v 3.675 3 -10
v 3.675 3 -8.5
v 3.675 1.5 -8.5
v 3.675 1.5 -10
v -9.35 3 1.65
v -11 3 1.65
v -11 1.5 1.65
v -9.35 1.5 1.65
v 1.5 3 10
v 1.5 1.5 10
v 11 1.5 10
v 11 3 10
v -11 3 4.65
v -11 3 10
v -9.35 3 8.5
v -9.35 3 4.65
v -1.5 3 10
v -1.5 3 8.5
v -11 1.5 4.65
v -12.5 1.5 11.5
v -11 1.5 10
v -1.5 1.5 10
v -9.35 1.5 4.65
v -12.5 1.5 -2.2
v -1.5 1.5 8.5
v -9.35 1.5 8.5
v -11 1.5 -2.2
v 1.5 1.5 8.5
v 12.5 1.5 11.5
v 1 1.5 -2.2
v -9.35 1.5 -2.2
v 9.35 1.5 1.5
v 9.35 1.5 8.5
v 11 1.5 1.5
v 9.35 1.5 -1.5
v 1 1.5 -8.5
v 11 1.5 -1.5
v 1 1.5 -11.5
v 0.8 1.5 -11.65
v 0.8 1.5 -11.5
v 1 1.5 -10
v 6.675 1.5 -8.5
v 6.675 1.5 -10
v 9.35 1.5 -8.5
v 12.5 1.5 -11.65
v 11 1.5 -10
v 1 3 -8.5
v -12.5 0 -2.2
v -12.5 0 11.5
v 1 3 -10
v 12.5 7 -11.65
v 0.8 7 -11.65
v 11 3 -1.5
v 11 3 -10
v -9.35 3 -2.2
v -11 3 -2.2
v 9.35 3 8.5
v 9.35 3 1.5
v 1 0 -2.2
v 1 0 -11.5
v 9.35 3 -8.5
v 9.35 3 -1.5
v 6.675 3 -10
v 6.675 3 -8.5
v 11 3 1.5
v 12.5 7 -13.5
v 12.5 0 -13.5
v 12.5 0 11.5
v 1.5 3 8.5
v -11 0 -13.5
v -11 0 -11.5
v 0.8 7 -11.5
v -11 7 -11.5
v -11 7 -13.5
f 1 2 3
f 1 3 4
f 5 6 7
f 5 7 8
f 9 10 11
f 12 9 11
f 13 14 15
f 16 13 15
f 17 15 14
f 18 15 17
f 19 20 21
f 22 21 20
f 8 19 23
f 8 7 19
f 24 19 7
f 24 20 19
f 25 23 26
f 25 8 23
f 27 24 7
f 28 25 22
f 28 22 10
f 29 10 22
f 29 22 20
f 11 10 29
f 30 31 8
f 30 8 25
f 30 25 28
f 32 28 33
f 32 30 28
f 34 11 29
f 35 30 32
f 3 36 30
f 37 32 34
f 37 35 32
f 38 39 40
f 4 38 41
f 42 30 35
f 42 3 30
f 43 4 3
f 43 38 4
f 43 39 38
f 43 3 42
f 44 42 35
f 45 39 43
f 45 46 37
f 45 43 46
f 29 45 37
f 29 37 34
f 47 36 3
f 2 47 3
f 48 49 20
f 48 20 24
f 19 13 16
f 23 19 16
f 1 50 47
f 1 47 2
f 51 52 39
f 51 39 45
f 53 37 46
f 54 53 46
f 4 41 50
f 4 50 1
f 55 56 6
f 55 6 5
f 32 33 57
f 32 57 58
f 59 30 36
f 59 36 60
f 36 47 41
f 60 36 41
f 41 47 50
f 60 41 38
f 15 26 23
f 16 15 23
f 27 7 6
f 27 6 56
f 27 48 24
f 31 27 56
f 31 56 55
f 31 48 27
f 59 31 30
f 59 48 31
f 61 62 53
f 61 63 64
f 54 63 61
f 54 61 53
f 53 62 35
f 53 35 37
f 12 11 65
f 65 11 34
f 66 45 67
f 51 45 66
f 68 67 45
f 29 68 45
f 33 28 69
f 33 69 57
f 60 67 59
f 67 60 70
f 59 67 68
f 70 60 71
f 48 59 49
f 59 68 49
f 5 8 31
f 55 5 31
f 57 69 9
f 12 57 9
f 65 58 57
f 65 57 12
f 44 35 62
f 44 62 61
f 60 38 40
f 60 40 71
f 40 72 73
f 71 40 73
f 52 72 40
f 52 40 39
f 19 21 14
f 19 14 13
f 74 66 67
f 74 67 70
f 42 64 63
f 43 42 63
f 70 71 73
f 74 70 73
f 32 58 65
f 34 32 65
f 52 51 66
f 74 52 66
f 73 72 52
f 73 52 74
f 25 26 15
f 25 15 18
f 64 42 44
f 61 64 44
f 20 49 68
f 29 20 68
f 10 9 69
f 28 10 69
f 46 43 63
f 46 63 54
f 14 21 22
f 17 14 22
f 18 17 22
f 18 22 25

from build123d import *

# Parameters (mm, degrees)
SKETCH1_W               = 25
SKETCH1_H               = 23
BOSS_EXTRUDE1_DEPTH     = 1.5
SKETCH2_W               = 22
SKETCH2_H               = 20
SKETCH2_W_2             = 18.7
SKETCH2_H_2             = 17
BOSS_EXTRUDE2_DEPTH     = 1.5
SKETCH4_W               = 12
SKETCH4_H               = 7.8
CUT_EXTRUDE2_DEPTH      = 2.5
CUT_EXTRUDE2_DEPTH_BACK = 2.5
SKETCH5_W               = 13.5
SKETCH5_H               = 9.3
CUT_EXTRUDE3_DEPTH      = 4
SKETCH6_W               = 1.65
SKETCH6_H               = 3
SKETCH6_W_2             = 3
SKETCH6_H_2             = 1.5
CUT_EXTRUDE4_DEPTH      = 1.5
SKETCH7_W               = 23.5
SKETCH7_H               = 7
BOSS_EXTRUDE3_DEPTH     = 2
SKETCH8_W               = 11.7
SKETCH8_H               = 0.15
CUT_EXTRUDE5_DEPTH      = 5.5


with BuildPart() as part:
    # Sketch1 → Boss-Extrude1 (new body)
    with BuildSketch(Plane(origin=(0, 0, 0), x_dir=(1, 0, 0), z_dir=(0, 1, 0))):
        Rectangle(SKETCH1_W, SKETCH1_H)
    extrude(amount=BOSS_EXTRUDE1_DEPTH)

    # Sketch2 → Boss-Extrude2 (add)
    with BuildSketch(Plane(origin=(0, 1.5, 0), x_dir=(1, 0, 0), z_dir=(0, 1, 0))):
        Rectangle(SKETCH2_W, SKETCH2_H)
        Rectangle(SKETCH2_W_2, SKETCH2_H_2, mode=Mode.SUBTRACT)
    extrude(amount=BOSS_EXTRUDE2_DEPTH)

    # Sketch4 → Cut-Extrude2 (cut, two sides)
    with BuildSketch(Plane(origin=(0, 1.5, 0), x_dir=(1, 0, 0), z_dir=(0, 1, 0))) as cut_extrude2_sk:
        with Locations((-5, 6.1)):
            Rectangle(SKETCH4_W, SKETCH4_H)
    extrude(amount=CUT_EXTRUDE2_DEPTH, mode=Mode.SUBTRACT)
    extrude(cut_extrude2_sk.sketch, amount=-CUT_EXTRUDE2_DEPTH_BACK, mode=Mode.SUBTRACT)

    # Sketch5 → Cut-Extrude3 (cut, through all)
    with BuildSketch(Plane.XZ):
        with Locations((-5.75, -6.85)):
            Rectangle(SKETCH5_W, SKETCH5_H)
    extrude(amount=-CUT_EXTRUDE3_DEPTH, mode=Mode.SUBTRACT)

    # Sketch6 → Cut-Extrude4 (cut)
    with BuildSketch(Plane(origin=(0, 3, 0), x_dir=(1, 0, 0), z_dir=(0, 1, 0))):
        with Locations((-10.175, -3.15)):
            Rectangle(SKETCH6_W, SKETCH6_H)
        with Locations((0, -9.25)):
            Rectangle(SKETCH6_W_2, SKETCH6_H_2)
        with Locations((10.175, 0)):
            Rectangle(SKETCH6_W, SKETCH6_H)
        with Locations((5.175, 9.25)):
            Rectangle(SKETCH6_W_2, SKETCH6_H_2)
    extrude(amount=-CUT_EXTRUDE4_DEPTH, mode=Mode.SUBTRACT)

    # Sketch7 → Boss-Extrude3 (add)
    with BuildSketch(Plane(origin=(0, 0, -11.5), x_dir=(-1, 0, 0), z_dir=(0, 0, -1))):
        with Locations((-0.75, 3.5)):
            Rectangle(SKETCH7_W, SKETCH7_H)
    extrude(amount=BOSS_EXTRUDE3_DEPTH)

    # Sketch8 → Cut-Extrude5 (cut)
    with BuildSketch(Plane(origin=(0, 7, 0), x_dir=(1, 0, 0), z_dir=(0, 1, 0))):
        with Locations((6.65, 11.575)):
            Rectangle(SKETCH8_W, SKETCH8_H)
    extrude(amount=-CUT_EXTRUDE5_DEPTH, mode=Mode.SUBTRACT)


solid = part.part
